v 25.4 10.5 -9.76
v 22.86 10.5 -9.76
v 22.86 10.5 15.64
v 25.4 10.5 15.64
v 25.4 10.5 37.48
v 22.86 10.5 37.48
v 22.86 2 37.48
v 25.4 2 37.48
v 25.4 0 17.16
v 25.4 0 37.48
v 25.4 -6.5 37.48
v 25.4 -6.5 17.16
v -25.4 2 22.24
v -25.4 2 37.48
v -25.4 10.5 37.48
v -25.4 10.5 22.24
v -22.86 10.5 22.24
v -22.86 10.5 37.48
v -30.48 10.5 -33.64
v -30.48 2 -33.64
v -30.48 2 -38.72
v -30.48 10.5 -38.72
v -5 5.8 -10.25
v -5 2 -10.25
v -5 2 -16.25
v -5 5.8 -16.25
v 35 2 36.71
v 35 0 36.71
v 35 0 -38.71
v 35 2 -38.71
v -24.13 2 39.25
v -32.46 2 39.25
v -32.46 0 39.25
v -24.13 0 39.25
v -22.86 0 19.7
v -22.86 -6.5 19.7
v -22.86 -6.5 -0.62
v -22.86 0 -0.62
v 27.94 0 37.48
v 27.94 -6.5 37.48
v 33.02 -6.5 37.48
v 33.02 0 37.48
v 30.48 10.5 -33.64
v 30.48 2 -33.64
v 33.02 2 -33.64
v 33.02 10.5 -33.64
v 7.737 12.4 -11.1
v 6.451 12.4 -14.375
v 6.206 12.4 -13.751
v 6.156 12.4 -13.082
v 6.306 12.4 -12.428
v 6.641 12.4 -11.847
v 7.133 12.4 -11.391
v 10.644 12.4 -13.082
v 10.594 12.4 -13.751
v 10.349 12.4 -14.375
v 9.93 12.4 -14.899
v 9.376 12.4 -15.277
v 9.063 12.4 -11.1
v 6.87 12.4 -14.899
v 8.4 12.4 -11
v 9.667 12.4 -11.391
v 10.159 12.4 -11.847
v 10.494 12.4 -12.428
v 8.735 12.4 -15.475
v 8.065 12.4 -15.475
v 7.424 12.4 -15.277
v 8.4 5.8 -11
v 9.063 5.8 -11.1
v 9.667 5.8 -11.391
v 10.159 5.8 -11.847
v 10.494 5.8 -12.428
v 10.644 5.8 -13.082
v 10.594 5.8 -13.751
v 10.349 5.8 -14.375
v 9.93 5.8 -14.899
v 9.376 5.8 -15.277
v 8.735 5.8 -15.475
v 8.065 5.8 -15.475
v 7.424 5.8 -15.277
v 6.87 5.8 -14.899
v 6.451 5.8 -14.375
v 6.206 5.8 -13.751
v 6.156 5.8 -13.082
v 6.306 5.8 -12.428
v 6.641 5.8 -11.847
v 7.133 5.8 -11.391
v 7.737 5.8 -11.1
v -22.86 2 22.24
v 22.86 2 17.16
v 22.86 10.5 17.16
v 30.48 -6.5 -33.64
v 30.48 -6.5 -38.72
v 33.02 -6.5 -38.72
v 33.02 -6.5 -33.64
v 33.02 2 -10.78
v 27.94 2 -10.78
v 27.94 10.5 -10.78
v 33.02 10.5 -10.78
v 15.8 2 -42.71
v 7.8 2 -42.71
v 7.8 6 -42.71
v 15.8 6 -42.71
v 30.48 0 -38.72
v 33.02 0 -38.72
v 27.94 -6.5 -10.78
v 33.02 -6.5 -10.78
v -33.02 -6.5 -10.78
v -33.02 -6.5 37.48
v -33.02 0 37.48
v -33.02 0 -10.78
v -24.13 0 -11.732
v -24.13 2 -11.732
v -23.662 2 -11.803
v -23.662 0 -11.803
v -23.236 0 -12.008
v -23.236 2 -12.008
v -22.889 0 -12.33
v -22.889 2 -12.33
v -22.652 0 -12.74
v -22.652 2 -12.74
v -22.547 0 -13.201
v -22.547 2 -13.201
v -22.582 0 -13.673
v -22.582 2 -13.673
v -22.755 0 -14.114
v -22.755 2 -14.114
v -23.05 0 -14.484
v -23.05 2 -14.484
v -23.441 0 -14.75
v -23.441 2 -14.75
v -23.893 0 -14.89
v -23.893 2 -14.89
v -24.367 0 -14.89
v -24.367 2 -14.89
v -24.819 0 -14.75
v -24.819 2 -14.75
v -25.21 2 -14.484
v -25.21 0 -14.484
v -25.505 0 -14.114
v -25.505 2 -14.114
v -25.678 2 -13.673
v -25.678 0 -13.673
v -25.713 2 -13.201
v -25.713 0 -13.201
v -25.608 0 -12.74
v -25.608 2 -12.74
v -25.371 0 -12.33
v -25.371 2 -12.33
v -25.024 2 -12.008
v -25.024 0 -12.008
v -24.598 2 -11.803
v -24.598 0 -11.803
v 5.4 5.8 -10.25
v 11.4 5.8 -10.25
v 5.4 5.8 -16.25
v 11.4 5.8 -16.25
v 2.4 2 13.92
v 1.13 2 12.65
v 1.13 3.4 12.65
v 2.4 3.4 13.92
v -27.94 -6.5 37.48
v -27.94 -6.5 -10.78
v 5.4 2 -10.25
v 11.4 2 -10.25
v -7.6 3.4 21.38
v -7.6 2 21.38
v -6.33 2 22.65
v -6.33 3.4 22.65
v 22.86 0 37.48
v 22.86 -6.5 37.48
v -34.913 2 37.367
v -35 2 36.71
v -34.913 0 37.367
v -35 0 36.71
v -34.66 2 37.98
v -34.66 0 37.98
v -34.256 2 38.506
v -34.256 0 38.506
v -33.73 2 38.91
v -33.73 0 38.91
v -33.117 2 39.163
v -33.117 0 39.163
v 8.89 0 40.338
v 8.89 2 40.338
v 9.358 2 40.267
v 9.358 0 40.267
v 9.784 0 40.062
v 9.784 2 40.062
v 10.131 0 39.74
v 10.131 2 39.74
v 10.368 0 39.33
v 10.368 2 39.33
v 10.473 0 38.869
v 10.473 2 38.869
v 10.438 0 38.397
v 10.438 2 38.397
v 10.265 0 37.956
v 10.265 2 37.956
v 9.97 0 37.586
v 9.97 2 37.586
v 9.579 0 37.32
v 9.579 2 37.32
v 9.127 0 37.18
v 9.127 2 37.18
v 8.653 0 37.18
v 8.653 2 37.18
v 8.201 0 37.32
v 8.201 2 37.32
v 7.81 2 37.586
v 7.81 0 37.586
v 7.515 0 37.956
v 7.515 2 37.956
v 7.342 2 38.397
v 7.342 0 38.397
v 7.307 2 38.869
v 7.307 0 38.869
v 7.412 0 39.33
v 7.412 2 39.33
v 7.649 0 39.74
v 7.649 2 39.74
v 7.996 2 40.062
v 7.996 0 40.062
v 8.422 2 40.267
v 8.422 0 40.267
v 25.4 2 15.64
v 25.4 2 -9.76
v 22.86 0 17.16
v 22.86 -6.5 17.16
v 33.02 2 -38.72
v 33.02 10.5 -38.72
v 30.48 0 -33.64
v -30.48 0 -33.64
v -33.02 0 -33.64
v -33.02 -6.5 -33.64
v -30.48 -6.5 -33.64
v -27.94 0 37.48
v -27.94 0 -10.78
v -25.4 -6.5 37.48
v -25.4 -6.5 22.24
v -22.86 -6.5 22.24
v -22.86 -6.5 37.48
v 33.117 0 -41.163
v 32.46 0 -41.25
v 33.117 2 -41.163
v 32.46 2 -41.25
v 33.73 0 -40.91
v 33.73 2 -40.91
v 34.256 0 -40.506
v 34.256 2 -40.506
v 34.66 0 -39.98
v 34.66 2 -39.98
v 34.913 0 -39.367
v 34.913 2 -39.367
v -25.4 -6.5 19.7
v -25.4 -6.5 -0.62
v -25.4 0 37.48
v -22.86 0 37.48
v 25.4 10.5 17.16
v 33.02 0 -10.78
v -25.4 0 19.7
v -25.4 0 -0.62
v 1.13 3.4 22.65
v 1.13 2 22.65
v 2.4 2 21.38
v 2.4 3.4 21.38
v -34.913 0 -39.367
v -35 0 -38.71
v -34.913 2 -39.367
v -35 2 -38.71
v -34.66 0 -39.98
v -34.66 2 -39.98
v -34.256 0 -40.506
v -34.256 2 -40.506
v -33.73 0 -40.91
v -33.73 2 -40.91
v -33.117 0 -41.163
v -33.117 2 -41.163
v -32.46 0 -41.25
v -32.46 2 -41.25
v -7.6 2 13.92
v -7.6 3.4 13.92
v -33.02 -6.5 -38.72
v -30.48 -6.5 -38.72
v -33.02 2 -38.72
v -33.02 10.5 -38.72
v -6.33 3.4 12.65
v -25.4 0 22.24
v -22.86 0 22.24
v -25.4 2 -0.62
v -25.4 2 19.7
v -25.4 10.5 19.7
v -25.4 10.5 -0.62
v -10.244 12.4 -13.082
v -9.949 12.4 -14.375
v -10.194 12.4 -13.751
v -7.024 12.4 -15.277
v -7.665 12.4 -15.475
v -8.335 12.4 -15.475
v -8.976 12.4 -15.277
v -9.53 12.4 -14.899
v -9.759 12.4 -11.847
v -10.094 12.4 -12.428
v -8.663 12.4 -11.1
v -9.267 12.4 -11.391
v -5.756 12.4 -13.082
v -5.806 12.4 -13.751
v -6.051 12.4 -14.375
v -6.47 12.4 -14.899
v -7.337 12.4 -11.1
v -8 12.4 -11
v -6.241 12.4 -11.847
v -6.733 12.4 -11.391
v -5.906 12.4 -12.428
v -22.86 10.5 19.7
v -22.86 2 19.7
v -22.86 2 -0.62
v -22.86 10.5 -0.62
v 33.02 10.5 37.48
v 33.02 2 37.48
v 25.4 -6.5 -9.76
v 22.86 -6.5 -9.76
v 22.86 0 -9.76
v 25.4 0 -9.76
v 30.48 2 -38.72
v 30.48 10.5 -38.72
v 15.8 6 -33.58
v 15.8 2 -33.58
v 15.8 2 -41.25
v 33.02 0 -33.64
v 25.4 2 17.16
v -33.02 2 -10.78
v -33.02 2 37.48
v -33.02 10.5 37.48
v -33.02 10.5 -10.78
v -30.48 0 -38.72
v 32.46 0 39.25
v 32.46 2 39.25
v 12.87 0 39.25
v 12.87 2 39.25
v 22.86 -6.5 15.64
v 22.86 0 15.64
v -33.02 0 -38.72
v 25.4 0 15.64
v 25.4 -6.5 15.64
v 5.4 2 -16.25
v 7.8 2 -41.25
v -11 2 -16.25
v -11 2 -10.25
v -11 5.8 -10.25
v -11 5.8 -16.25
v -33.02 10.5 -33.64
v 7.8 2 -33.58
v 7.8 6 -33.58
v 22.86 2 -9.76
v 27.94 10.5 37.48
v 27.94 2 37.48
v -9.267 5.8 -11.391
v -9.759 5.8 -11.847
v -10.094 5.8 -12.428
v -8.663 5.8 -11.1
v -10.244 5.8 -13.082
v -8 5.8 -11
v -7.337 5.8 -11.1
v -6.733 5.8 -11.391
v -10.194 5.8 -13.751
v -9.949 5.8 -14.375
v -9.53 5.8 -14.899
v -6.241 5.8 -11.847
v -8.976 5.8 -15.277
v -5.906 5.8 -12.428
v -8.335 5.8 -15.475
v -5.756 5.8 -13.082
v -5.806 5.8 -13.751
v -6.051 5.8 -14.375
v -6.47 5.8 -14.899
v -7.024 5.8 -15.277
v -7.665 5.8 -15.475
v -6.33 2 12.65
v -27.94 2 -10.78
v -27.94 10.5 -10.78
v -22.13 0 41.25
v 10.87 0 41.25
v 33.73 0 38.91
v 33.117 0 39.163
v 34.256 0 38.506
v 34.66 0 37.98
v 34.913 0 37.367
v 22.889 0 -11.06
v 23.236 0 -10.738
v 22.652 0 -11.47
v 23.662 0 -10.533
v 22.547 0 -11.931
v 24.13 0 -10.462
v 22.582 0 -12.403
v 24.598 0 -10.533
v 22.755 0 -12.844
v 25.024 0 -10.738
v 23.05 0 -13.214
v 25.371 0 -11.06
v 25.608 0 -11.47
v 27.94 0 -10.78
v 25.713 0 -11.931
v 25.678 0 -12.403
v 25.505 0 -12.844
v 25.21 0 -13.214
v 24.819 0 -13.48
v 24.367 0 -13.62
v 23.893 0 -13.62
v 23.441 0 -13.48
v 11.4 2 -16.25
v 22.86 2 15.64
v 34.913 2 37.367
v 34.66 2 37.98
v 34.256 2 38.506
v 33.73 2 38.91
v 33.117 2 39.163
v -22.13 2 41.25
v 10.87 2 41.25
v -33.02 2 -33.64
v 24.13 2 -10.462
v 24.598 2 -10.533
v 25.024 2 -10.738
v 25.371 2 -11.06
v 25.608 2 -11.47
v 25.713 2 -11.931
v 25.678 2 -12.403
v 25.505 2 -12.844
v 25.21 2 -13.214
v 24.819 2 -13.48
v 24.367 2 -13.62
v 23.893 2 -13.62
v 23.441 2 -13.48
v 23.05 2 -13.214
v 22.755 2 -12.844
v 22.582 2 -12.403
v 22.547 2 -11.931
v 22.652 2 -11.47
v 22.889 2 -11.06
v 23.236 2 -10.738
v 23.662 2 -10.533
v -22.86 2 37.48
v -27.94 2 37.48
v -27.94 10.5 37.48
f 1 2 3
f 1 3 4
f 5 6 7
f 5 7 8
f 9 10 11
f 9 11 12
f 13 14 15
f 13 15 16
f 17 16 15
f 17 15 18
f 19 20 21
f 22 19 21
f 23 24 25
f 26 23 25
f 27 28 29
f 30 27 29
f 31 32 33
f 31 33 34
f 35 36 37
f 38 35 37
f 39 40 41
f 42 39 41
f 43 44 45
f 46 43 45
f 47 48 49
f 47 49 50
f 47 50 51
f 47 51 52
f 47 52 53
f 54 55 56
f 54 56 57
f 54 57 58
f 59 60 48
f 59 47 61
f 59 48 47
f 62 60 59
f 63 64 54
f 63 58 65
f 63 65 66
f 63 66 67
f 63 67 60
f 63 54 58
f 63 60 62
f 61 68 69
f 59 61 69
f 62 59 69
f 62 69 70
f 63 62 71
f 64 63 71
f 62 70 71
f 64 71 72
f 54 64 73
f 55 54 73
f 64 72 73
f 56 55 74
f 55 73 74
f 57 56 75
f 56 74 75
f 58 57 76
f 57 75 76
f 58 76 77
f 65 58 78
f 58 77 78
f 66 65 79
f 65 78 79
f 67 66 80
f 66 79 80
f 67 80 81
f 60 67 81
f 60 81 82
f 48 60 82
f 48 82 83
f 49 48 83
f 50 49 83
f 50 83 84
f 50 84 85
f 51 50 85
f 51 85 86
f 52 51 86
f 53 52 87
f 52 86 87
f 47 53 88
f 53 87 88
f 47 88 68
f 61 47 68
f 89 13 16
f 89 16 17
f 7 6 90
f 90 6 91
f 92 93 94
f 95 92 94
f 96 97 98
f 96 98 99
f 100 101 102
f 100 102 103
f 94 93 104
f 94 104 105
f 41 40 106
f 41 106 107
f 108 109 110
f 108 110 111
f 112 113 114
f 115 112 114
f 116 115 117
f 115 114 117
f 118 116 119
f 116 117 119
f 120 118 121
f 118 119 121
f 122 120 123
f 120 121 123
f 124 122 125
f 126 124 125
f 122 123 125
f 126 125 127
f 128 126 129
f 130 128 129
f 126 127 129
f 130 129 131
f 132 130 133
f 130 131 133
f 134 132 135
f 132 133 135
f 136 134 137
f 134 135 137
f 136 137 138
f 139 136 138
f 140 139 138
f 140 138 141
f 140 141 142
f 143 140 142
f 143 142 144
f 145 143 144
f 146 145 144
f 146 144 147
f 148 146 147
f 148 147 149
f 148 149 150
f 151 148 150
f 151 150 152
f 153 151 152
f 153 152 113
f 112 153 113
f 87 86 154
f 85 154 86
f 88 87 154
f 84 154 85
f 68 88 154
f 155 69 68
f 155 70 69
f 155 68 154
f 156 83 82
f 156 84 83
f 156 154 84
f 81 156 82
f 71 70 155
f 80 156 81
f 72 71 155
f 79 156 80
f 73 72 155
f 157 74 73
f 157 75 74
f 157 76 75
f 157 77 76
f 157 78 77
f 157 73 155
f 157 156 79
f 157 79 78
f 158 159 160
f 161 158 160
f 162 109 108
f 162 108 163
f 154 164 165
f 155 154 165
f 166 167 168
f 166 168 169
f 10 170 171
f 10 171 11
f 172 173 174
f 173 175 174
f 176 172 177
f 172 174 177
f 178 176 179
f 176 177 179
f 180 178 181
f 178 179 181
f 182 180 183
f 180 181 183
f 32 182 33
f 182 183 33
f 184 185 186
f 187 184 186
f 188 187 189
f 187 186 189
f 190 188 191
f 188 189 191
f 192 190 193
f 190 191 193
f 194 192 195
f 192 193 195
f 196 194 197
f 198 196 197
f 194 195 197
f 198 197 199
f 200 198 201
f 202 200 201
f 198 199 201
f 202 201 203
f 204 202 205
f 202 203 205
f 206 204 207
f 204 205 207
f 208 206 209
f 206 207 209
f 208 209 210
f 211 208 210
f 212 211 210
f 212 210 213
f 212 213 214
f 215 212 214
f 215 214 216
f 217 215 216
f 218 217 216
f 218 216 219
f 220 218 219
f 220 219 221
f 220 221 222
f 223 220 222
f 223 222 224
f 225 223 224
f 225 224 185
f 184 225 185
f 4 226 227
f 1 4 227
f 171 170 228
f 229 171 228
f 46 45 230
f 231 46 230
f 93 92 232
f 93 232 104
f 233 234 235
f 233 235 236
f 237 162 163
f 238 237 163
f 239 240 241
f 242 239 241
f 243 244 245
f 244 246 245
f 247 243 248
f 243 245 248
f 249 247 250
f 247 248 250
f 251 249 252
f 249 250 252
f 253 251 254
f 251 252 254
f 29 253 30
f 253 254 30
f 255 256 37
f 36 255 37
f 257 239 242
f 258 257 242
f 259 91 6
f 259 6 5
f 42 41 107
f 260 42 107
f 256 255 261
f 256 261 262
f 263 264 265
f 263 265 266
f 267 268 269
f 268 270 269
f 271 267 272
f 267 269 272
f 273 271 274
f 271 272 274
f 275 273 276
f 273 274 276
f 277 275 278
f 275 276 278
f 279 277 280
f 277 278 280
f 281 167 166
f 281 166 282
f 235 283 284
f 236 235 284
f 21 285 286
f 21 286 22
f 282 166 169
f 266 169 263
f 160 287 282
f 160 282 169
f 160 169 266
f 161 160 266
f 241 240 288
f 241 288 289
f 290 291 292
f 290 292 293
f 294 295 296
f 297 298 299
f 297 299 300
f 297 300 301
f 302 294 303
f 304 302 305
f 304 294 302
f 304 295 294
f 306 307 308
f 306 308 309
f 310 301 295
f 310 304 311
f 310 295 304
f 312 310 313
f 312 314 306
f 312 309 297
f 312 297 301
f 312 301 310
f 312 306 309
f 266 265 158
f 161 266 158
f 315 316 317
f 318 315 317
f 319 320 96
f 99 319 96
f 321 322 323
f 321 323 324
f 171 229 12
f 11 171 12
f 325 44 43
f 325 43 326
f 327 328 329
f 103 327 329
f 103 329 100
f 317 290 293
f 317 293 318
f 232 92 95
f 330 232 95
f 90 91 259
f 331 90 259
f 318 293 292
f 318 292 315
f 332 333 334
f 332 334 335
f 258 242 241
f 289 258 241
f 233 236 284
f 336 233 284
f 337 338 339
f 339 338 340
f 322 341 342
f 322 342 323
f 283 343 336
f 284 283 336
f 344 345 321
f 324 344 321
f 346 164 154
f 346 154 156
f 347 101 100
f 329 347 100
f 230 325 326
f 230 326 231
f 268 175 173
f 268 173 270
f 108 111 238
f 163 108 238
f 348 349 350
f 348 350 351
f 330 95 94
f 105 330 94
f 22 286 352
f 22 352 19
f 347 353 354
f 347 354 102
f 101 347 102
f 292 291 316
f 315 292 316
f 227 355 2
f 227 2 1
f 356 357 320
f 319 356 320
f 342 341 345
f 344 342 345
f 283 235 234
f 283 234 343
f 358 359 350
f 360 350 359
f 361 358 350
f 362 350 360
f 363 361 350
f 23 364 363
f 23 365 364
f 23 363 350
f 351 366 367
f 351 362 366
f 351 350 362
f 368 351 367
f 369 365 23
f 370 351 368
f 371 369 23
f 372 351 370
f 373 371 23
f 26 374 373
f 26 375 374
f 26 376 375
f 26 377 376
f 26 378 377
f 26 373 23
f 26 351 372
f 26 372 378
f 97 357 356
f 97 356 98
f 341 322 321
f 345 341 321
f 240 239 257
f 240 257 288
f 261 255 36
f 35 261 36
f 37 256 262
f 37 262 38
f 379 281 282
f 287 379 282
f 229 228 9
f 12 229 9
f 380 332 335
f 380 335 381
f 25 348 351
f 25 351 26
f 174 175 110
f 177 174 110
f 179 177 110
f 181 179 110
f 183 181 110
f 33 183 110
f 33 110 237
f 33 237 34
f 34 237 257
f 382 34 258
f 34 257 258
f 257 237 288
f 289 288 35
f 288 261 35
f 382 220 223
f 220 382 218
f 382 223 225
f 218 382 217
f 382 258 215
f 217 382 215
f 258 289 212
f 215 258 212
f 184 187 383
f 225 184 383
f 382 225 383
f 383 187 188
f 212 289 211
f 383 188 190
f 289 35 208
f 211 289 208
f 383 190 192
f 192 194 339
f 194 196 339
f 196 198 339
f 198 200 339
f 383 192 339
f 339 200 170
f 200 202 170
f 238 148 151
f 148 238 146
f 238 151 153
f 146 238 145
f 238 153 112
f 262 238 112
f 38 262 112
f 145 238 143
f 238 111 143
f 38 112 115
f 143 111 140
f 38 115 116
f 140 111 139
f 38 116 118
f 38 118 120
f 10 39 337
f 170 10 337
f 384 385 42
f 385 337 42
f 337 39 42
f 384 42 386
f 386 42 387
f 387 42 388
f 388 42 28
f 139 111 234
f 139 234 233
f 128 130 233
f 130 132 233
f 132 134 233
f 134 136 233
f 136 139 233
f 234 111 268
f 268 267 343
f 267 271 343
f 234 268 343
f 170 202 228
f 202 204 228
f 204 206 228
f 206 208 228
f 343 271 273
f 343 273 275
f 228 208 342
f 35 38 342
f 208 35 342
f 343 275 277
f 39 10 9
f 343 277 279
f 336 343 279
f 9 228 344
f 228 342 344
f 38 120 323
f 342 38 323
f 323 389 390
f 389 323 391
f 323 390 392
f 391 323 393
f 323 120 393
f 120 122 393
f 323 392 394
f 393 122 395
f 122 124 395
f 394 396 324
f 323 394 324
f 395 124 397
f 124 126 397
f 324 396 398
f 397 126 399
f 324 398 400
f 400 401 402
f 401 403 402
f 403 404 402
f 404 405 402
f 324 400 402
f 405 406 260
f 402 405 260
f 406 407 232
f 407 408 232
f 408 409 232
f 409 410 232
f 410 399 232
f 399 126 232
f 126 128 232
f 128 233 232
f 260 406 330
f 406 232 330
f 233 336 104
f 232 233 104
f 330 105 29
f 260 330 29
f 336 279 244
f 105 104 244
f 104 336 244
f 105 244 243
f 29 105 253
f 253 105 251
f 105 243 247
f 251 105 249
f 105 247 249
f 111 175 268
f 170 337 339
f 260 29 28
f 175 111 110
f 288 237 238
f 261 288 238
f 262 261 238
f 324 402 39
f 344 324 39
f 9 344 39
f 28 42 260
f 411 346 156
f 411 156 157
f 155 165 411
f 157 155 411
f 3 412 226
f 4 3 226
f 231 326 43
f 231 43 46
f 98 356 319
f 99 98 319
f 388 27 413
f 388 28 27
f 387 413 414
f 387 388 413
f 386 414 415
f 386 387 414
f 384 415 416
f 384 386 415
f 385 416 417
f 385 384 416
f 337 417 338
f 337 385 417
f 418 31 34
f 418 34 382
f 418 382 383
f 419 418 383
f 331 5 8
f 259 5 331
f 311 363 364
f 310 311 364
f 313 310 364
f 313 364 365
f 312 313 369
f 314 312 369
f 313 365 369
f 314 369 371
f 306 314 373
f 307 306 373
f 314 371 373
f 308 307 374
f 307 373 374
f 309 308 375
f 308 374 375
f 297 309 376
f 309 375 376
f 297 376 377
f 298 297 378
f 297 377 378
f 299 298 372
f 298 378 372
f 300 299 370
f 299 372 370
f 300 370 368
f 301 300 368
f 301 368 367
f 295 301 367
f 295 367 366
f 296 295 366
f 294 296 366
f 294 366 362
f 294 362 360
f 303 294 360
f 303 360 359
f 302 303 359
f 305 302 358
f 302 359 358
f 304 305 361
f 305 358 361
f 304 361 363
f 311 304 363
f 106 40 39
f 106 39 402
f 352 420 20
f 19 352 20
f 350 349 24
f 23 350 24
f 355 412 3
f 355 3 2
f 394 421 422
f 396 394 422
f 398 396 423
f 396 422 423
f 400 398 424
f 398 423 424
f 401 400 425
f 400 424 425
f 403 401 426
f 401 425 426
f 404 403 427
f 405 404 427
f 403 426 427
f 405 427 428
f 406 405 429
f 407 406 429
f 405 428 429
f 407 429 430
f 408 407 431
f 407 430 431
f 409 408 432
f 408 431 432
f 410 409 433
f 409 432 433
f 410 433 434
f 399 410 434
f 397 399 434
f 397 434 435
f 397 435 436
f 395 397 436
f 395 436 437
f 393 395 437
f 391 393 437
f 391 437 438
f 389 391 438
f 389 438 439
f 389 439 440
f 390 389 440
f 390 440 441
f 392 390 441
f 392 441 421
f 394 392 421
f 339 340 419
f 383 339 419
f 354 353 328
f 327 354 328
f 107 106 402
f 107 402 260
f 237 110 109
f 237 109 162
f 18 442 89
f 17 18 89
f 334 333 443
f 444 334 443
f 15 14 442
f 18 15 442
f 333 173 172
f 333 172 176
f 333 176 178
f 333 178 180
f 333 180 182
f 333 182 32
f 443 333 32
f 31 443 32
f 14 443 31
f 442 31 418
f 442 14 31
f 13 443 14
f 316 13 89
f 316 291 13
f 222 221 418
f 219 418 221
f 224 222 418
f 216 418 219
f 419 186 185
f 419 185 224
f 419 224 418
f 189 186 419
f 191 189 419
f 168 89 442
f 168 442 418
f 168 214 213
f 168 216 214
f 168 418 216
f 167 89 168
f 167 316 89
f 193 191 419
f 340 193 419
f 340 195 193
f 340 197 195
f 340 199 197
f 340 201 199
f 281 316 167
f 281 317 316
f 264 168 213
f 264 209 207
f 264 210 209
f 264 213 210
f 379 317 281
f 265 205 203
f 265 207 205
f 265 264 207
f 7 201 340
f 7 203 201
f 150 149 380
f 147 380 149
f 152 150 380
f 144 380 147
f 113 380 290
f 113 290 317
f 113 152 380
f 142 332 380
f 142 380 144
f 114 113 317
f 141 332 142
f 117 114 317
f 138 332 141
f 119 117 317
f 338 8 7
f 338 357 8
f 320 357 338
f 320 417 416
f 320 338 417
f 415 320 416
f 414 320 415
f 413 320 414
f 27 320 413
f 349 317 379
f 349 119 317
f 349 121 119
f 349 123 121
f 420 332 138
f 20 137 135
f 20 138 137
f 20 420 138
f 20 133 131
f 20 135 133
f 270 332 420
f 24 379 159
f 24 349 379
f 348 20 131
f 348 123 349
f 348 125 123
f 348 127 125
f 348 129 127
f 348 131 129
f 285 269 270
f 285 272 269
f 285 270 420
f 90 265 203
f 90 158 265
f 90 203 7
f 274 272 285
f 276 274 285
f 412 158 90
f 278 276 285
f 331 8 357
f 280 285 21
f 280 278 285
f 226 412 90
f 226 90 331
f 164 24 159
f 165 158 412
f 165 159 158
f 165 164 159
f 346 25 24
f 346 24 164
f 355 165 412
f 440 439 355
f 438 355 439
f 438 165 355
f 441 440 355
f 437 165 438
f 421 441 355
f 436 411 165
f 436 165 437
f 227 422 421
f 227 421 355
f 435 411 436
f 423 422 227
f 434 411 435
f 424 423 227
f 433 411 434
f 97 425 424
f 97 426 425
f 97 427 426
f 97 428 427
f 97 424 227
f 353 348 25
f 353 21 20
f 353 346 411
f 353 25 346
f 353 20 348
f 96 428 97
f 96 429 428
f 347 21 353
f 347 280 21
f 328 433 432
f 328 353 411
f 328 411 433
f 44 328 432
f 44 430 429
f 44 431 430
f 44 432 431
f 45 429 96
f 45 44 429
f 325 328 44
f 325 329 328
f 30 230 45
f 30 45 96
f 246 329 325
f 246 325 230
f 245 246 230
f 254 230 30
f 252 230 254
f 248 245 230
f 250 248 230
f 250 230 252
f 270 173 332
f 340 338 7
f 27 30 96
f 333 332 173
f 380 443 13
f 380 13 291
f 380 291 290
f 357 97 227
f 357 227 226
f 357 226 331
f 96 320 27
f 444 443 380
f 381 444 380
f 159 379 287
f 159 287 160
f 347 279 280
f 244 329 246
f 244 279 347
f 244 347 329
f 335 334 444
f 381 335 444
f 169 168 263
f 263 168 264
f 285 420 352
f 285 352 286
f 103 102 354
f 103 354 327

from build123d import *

# Parameters (mm, degrees)
SKETCH1_W           = 70
SKETCH1_H           = 82.5
BOSS_EXTRUDE1_DEPTH = 2
SKETCH2_R           = 1.5875
CUT_EXTRUDE1_DEPTH  = 55.134670037
FILLET1_R           = 2.54
SKETCH2_3_W         = 5.08
SKETCH2_3_H         = 48.26
SKETCH2_3_W_2       = 2.54
SKETCH2_3_H_2       = 25.4
SKETCH2_3_H_3       = 20.32
SKETCH2_3_H_4       = 15.24
SKETCH2_3_H_5       = 5.08
BOSS_EXTRUDE2_DEPTH = 8.500000018
SKETCH4_W           = 8
SKETCH4_H           = 9.13
BOSS_EXTRUDE3_DEPTH = 4
SKETCH4_3_W         = 6
SKETCH4_3_H         = 6
BOSS_EXTRUDE4_DEPTH = 3.8
SKETCH5_R           = 2.25
BOSS_EXTRUDE5_DEPTH = 6.6
SKETCH6_W           = 10
SKETCH6_H           = 10
BOSS_EXTRUDE6_DEPTH = 1.4
CHAMFER1_SIZE       = 1.27


with BuildPart() as part:
    # Sketch1 → Boss-Extrude1 (new body)
    with BuildSketch(Plane(origin=(0, 0, 0), x_dir=(1, 0, 0), z_dir=(0, 1, 0))):
        Rectangle(SKETCH1_W, SKETCH1_H)
    extrude(amount=BOSS_EXTRUDE1_DEPTH)

    # Sketch2 → Cut-Extrude1 (cut, through all)
    with BuildSketch(Plane(origin=(0, 2, 0), x_dir=(1, 0, 0), z_dir=(0, 1, 0))):
        with Locations((8.89, -38.75)):
            Circle(SKETCH2_R)
        with Locations((24.13, 12.05)):
            Circle(SKETCH2_R)
        with Locations((-24.13, 13.32)):
            Circle(SKETCH2_R)
        Polygon((-35, -41.25), (-35, -39.25), (-24.13, -39.25), (-22.13, -41.25), align=None)
        Polygon((35, -39.25), (12.87, -39.25), (10.87, -41.25), (35, -41.25), align=None)
    extrude(amount=-CUT_EXTRUDE1_DEPTH, mode=Mode.SUBTRACT)

    # Fillet1
    fillet1_edges = [part.edges().sort_by_distance(p)[0] for p in [
        (-35, 1, -41.25),
        (35, 1, -41.25),
        (35, 1, 39.25),
        (-35, 1, 39.25),
    ]]
    fillet(fillet1_edges, radius=FILLET1_R)

    # Sketch2<3> → Boss-Extrude2 (add, symmetric)
    with BuildSketch(Plane(origin=(0, 2, 0), x_dir=(1, 0, 0), z_dir=(0, 1, 0))):
        with Locations((30.48, -13.35)):
            Rectangle(SKETCH2_3_W, SKETCH2_3_H)
        with Locations((-30.48, -13.35)):
            Rectangle(SKETCH2_3_W, SKETCH2_3_H)
        with Locations((24.13, -2.94)):
            Rectangle(SKETCH2_3_W_2, SKETCH2_3_H_2)
        with Locations((24.13, -27.32)):
            Rectangle(SKETCH2_3_W_2, SKETCH2_3_H_3)
        with Locations((-24.13, -9.54)):
            Rectangle(SKETCH2_3_W_2, SKETCH2_3_H_3)
        with Locations((-24.13, -29.86)):
            Rectangle(SKETCH2_3_W_2, SKETCH2_3_H_4)
        with Locations((-31.75, 36.18)):
            Rectangle(SKETCH2_3_W_2, SKETCH2_3_H_5)
        with Locations((31.75, 36.18)):
            Rectangle(SKETCH2_3_W_2, SKETCH2_3_H_5)
    extrude(amount=BOSS_EXTRUDE2_DEPTH, both=True)

    # Sketch4 → Boss-Extrude3 (add)
    with BuildSketch(Plane(origin=(0, 2, 0), x_dir=(1, 0, 0), z_dir=(0, 1, 0))):
        with Locations((11.8, 38.145)):
            Rectangle(SKETCH4_W, SKETCH4_H)
    extrude(amount=BOSS_EXTRUDE3_DEPTH)

    # Sketch4<3> → Boss-Extrude4 (add)
    with BuildSketch(Plane(origin=(0, 2, 0), x_dir=(1, 0, 0), z_dir=(0, 1, 0))):
        with Locations((-8, 13.25)):
            Rectangle(SKETCH4_3_W, SKETCH4_3_H)
        with Locations((8.4, 13.25)):
            Rectangle(SKETCH4_3_W, SKETCH4_3_H)
    extrude(amount=BOSS_EXTRUDE4_DEPTH)

    # Sketch5 → Boss-Extrude5 (add)
    with BuildSketch(Plane(origin=(0, 5.8, 0), x_dir=(1, 0, 0), z_dir=(0, 1, 0))):
        with Locations((-8, 13.25)):
            Circle(SKETCH5_R)
        with Locations((8.4, 13.25)):
            Circle(SKETCH5_R)
    extrude(amount=BOSS_EXTRUDE5_DEPTH)

    # Sketch6 → Boss-Extrude6 (add)
    with BuildSketch(Plane(origin=(0, 2, 0), x_dir=(1, 0, 0), z_dir=(0, 1, 0))):
        with Locations((-2.6, -17.65)):
            Rectangle(SKETCH6_W, SKETCH6_H)
    extrude(amount=BOSS_EXTRUDE6_DEPTH)

    # Chamfer1
    chamfer1_edges = [part.edges().sort_by_distance(p)[0] for p in [
        (2.4, 2.7, 22.65),
        (2.4, 2.7, 12.65),
        (-7.6, 2.7, 12.65),
        (-7.6, 2.7, 22.65),
    ]]
    chamfer(chamfer1_edges, length=CHAMFER1_SIZE)


solid = part.part
